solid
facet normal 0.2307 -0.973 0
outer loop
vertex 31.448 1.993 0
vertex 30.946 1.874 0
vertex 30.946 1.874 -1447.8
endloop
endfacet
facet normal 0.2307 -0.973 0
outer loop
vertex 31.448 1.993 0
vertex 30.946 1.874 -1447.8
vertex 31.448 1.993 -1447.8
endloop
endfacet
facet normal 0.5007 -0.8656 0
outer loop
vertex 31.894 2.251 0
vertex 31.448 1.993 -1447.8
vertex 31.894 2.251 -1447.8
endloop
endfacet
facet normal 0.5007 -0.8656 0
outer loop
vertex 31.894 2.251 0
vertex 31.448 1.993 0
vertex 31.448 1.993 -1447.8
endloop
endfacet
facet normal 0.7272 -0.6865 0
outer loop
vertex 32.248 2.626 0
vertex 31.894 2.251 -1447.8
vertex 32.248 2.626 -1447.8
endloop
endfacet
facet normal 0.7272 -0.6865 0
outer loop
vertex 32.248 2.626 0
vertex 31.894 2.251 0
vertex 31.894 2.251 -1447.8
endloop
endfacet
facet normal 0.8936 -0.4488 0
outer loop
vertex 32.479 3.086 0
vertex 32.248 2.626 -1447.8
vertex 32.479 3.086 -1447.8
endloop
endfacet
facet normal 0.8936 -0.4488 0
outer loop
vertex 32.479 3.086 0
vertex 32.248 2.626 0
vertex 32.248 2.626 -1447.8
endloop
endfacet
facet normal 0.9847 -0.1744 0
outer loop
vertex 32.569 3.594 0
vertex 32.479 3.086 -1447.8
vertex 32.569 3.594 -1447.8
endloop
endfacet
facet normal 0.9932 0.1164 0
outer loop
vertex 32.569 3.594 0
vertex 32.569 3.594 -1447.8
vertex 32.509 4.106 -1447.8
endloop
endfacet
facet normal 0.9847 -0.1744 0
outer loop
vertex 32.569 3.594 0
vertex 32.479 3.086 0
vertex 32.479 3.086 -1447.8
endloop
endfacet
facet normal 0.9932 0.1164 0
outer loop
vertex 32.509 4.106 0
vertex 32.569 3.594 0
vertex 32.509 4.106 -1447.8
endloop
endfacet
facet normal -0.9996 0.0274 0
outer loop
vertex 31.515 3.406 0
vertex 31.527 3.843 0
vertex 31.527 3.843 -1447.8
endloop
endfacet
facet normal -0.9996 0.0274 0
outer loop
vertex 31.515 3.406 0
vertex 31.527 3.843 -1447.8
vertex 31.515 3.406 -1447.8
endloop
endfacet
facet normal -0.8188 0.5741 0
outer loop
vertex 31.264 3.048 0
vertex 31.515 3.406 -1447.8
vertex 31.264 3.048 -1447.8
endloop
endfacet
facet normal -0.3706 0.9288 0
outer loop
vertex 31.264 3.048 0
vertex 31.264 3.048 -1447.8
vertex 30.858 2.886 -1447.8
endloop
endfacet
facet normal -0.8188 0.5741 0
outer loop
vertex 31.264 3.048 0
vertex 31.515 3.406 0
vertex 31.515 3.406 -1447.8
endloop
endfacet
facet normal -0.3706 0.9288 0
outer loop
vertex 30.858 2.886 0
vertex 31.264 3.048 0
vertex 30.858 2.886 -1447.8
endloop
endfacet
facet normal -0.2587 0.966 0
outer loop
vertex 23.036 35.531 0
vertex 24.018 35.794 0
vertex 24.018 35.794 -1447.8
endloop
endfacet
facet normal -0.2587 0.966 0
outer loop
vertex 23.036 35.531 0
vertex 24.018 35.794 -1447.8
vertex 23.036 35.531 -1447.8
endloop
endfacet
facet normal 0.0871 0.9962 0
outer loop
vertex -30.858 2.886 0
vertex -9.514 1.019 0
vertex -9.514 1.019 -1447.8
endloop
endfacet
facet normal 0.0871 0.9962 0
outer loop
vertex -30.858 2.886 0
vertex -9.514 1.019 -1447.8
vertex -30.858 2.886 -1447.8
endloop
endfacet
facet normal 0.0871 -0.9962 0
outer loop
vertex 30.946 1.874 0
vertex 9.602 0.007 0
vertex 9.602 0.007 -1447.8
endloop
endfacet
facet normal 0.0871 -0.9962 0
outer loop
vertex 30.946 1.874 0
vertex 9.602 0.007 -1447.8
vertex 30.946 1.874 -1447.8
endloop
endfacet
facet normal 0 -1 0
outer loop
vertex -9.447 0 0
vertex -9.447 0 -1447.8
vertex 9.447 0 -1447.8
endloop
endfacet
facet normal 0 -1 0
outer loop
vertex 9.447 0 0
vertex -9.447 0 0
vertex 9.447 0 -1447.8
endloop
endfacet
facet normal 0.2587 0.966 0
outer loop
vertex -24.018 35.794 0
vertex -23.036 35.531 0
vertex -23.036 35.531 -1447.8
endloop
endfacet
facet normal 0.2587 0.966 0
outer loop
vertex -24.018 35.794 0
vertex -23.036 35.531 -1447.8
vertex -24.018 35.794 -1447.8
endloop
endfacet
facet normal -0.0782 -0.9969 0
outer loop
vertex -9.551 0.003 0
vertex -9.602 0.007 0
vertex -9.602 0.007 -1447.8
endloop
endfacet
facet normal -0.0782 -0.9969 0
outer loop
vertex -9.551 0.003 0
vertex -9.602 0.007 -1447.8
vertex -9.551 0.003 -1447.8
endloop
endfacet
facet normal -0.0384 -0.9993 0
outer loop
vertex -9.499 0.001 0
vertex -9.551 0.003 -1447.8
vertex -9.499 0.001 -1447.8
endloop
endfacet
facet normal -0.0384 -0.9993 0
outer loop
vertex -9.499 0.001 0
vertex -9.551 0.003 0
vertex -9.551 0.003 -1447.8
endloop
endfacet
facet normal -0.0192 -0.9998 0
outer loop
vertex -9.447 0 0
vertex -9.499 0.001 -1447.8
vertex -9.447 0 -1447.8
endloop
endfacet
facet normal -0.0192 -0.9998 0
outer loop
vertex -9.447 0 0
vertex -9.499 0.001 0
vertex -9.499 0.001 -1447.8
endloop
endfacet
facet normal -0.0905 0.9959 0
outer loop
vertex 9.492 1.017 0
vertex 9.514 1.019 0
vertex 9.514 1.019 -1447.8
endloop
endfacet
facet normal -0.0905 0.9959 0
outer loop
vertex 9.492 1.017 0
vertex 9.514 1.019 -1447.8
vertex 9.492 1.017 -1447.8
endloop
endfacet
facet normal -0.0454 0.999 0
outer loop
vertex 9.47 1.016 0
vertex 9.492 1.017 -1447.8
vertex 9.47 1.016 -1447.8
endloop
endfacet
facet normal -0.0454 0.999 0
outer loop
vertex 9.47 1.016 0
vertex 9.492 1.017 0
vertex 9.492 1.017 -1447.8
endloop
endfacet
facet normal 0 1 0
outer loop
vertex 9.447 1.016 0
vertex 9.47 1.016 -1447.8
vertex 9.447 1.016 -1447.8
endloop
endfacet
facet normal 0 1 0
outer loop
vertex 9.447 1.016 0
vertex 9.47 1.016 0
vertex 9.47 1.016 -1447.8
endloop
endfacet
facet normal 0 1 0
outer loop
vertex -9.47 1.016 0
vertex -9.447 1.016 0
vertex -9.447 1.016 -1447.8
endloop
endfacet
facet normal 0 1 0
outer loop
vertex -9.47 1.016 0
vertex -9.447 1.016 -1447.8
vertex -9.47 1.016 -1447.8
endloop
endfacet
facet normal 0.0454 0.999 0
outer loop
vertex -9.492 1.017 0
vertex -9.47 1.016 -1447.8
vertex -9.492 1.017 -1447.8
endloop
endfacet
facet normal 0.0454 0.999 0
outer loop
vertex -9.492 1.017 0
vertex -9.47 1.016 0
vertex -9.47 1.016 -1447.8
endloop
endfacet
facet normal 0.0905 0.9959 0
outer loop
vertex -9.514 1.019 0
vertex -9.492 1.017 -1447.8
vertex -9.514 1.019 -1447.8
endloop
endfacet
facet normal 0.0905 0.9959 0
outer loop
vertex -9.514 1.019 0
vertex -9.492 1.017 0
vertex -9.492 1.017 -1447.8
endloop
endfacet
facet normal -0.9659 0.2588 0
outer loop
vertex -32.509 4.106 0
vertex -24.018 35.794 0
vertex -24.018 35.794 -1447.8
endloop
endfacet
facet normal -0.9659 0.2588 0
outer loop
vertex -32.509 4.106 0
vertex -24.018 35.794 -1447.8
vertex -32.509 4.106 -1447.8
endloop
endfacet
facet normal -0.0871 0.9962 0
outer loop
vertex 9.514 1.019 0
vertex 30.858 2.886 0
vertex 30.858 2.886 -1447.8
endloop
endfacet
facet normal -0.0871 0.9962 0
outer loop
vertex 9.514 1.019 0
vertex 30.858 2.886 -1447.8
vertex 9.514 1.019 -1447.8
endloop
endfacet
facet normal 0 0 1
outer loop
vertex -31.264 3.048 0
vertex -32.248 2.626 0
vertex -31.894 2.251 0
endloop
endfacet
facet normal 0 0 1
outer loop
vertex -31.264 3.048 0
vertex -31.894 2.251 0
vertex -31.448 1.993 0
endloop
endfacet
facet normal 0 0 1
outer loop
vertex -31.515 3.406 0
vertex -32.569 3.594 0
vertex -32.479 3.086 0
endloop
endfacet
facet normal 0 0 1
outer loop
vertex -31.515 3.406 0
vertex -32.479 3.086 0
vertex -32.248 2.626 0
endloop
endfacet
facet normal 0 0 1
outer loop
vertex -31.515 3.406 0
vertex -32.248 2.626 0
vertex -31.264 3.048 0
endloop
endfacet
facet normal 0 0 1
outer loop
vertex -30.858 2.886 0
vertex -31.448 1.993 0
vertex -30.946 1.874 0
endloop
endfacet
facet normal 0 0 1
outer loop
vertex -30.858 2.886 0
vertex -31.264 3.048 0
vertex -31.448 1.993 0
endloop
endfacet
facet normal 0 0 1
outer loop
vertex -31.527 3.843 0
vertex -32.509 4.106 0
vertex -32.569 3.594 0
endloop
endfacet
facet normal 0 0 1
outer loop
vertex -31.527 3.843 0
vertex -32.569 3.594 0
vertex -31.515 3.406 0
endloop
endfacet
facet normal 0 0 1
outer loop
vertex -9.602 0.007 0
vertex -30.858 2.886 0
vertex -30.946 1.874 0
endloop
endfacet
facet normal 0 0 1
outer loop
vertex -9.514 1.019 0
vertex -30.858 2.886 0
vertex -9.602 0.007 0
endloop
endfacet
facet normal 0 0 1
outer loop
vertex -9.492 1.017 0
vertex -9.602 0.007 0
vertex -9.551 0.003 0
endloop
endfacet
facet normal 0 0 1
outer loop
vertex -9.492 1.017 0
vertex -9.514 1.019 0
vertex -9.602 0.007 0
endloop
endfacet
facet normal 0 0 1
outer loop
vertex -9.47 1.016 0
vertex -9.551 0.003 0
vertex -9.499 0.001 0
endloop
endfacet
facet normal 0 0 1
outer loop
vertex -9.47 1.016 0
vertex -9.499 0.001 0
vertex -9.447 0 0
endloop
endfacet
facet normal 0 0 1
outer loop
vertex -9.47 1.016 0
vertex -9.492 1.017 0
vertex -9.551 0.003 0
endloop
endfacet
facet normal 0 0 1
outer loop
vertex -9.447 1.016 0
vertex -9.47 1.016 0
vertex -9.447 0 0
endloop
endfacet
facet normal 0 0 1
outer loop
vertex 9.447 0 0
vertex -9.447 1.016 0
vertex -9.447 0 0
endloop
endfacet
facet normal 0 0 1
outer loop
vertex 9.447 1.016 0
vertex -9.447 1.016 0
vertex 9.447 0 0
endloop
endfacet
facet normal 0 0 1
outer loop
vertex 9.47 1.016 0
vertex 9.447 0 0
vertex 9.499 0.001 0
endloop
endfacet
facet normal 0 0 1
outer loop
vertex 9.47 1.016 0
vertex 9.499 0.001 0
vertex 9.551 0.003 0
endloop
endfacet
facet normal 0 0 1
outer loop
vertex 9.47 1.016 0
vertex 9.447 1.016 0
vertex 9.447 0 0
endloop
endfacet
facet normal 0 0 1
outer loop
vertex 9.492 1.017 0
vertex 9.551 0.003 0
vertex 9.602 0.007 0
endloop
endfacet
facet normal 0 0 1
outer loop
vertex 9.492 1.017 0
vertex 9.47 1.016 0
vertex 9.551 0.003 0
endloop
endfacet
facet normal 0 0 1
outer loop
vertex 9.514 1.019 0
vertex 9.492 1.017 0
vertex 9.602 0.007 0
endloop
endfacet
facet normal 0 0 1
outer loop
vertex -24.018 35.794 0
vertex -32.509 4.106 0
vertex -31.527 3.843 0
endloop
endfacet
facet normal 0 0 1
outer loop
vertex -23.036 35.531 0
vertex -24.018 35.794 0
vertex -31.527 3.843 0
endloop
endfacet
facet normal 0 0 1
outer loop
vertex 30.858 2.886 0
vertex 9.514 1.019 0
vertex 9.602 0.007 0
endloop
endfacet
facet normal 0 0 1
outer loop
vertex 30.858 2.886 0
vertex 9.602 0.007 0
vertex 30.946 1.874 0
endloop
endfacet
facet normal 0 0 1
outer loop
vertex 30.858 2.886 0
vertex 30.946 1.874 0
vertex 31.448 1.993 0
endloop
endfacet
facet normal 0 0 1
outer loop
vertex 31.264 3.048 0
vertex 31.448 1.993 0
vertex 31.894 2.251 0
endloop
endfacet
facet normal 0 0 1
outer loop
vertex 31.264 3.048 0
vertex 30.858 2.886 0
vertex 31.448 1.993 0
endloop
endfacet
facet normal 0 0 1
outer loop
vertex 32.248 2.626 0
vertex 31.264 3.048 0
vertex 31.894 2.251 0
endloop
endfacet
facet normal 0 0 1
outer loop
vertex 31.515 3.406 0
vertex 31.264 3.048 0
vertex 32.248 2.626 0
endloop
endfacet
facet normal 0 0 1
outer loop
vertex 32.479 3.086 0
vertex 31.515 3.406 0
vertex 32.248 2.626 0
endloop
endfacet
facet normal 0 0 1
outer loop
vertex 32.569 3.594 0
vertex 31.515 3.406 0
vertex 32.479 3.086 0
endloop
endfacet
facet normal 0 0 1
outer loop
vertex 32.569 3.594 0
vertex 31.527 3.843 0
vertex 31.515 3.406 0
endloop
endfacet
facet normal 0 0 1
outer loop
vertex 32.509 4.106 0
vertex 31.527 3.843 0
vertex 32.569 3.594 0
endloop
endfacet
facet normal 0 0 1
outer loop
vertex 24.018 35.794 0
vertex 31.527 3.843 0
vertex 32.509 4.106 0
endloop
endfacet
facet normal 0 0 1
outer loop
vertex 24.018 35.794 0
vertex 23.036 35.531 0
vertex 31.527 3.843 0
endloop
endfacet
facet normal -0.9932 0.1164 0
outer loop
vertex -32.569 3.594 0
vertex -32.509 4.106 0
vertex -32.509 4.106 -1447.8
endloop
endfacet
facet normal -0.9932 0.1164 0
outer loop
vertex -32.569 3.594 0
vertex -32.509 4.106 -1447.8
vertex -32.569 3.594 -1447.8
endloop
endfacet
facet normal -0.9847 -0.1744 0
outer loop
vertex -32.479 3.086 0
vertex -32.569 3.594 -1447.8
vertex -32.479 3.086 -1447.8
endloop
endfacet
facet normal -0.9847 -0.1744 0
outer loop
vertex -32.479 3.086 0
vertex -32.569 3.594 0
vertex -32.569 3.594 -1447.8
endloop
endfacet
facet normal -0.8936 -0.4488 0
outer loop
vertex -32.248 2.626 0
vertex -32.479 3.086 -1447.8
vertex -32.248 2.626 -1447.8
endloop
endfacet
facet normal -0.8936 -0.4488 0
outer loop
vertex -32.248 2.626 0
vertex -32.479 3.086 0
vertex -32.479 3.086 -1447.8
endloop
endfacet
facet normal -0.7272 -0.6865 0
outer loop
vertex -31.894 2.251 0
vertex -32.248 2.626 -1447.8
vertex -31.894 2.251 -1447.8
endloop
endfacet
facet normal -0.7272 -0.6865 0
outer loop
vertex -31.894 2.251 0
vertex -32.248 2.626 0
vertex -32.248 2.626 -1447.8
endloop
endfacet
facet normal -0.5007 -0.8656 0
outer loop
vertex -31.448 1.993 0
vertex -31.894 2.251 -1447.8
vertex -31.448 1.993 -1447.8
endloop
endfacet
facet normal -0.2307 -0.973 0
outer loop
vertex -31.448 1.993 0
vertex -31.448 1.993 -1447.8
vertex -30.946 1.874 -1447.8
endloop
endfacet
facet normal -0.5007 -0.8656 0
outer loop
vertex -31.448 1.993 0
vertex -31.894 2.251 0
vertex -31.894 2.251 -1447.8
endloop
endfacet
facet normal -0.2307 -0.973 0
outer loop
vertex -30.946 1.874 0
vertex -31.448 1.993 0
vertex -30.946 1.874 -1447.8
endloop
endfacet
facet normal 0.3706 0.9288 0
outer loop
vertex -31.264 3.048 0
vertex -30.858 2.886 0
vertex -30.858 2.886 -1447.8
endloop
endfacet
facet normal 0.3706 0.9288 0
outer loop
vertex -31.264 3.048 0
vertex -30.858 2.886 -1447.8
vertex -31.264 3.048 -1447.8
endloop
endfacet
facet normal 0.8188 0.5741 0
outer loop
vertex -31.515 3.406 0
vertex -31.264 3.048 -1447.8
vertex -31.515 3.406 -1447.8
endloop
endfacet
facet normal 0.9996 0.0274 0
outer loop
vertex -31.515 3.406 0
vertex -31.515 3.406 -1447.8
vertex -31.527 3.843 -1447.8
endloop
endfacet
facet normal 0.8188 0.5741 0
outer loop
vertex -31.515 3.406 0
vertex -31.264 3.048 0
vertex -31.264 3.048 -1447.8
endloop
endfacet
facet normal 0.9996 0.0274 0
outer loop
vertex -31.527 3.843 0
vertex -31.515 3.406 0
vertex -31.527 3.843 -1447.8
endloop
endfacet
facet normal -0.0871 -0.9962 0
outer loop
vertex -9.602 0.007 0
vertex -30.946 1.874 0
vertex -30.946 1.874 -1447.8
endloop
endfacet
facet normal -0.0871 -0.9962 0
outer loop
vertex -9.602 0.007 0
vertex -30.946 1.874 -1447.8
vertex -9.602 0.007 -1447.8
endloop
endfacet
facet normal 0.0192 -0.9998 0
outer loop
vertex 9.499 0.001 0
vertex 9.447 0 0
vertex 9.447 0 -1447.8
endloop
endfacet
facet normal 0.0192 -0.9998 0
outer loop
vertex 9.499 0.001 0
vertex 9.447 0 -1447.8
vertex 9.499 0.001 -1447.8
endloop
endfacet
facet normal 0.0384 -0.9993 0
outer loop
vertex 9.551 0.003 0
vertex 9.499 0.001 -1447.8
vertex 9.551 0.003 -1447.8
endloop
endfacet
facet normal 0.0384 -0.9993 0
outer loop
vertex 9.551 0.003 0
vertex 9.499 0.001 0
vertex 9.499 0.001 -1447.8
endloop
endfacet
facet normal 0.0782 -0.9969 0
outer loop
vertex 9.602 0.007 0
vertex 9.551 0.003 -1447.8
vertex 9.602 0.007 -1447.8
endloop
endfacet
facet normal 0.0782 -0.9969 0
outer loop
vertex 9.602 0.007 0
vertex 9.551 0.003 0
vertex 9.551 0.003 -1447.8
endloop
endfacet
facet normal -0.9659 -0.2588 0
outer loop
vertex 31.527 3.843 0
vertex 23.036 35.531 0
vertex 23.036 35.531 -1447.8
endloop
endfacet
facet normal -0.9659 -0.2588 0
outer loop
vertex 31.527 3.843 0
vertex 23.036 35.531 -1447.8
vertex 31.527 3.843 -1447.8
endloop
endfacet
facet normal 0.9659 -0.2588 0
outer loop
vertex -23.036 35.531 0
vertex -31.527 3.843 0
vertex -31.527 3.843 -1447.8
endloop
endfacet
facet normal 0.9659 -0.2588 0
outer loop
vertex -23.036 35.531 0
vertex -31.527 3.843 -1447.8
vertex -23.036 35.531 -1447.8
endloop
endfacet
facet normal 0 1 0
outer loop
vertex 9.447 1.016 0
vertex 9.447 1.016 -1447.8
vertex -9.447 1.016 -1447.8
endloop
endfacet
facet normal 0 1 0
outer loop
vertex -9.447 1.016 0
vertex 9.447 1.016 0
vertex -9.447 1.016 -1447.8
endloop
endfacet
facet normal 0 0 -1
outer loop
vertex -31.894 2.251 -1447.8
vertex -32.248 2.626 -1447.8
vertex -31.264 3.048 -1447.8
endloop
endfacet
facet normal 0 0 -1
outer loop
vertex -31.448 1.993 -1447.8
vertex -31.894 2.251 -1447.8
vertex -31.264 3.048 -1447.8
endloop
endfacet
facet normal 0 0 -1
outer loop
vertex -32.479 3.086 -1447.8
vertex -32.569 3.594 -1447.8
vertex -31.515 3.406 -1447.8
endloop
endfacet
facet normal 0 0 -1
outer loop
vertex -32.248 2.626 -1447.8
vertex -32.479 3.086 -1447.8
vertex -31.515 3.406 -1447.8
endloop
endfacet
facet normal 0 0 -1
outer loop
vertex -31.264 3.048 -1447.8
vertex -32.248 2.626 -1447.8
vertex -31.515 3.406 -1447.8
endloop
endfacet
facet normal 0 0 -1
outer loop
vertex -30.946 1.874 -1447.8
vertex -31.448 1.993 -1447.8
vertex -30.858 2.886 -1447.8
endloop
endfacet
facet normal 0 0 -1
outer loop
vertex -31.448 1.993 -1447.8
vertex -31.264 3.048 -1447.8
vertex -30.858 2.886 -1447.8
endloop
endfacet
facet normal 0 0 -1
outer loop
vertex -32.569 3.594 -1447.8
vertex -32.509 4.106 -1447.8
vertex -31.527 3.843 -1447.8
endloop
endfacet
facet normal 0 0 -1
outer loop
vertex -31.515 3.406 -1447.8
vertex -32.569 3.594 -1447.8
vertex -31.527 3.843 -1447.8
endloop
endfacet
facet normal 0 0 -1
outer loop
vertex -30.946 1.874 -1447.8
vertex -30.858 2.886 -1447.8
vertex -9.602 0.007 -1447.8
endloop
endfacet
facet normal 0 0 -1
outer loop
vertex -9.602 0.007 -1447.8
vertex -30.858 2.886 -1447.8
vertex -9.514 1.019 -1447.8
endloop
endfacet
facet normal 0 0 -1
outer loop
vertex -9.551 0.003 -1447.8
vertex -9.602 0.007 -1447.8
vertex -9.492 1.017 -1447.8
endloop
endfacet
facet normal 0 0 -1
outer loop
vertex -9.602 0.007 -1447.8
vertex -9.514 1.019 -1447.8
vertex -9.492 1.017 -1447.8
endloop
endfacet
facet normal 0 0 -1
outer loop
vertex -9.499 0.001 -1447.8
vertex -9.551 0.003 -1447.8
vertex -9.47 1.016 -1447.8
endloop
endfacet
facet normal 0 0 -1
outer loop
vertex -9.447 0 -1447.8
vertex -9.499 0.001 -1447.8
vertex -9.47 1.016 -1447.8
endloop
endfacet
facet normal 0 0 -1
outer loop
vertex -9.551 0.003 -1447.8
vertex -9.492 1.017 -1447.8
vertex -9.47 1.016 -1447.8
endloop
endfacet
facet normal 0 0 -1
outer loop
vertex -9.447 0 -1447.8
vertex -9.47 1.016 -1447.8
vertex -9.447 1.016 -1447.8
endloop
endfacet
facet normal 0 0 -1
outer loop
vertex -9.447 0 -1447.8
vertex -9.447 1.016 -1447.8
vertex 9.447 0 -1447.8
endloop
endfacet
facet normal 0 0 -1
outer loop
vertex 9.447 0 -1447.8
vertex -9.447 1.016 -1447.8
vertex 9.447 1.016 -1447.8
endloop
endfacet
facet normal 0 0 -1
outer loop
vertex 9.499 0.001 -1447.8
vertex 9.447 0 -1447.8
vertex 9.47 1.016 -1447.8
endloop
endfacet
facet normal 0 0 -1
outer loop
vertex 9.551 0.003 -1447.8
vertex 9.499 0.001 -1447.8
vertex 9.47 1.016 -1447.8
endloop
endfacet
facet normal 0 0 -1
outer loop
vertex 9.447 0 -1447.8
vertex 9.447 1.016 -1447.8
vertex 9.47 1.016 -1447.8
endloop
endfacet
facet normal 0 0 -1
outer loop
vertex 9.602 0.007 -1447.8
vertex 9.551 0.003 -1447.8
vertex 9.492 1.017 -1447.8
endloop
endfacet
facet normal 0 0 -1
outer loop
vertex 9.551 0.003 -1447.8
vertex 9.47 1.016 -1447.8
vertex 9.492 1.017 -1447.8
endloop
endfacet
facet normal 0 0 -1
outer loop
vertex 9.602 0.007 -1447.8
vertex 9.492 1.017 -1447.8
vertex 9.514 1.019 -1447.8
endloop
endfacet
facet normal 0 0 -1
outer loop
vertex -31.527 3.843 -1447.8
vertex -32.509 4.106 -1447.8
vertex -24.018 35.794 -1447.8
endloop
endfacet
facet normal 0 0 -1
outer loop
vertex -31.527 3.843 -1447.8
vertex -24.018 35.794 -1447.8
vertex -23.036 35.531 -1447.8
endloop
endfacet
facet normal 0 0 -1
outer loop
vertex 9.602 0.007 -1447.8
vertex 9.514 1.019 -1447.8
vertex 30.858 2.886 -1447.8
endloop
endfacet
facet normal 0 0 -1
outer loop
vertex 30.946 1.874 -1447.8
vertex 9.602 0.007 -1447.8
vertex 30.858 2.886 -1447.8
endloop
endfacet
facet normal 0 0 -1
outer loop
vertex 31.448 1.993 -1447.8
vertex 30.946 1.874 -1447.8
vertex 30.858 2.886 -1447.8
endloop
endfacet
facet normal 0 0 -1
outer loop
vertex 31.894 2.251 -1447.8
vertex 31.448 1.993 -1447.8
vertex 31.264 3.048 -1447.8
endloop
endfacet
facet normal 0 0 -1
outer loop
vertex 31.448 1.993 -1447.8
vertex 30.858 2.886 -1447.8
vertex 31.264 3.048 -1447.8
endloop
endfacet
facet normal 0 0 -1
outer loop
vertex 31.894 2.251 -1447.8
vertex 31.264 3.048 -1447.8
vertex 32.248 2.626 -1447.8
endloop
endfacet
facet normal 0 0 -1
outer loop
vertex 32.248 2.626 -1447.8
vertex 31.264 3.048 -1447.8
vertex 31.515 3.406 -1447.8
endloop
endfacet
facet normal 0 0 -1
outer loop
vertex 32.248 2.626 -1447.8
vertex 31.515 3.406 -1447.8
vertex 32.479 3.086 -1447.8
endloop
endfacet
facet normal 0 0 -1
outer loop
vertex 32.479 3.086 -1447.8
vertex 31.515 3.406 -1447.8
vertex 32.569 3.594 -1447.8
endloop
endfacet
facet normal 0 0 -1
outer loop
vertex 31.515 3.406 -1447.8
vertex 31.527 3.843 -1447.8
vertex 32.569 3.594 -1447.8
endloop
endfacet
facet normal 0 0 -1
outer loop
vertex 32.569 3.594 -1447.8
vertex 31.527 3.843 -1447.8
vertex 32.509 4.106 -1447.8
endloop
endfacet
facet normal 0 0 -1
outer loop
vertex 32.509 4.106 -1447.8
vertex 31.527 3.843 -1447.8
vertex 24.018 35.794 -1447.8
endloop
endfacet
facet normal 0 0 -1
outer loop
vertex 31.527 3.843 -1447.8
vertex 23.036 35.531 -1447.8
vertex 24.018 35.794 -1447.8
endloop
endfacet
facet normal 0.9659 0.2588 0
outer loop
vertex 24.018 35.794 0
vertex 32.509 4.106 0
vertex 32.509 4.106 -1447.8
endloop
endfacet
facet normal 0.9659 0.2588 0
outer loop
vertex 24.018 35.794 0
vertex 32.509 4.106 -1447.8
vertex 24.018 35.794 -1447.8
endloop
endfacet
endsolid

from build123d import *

# Parameters (mm, degrees)
BASE_FLANGE1_DEPTH = 1447.8


# Sheet-metal steps are written as plain solids
with BuildPart() as part:
    # Sketch1 → Base-Flange1 (new body)
    with BuildSketch(Plane.XY):
        with BuildLine():
            Line((-24.017856008, 35.793752438), (-32.508689678, 4.105529785))
            ThreePointArc((-32.508689678, 4.105529785), (-32.247725893, 2.625530619), (-30.946236469, 1.87411535))
            Line((-30.946236469, 1.87411535), (-9.602333754, 0.006765827))
            ThreePointArc((-9.602333754, 0.006765827), (-9.524926114, 0.001692262), (-9.447370844, 0))
            Line((-9.447370844, 0), (9.447370844, 0))
            ThreePointArc((9.447370844, 0), (9.524926114, 0.001692262), (9.602333754, 0.006765827))
            Line((9.602333754, 0.006765827), (30.946236469, 1.87411535))
            ThreePointArc((30.946236469, 1.87411535), (32.247725893, 2.625530619), (32.508689678, 4.105529785))
            Line((32.508689678, 4.105529785), (24.017856008, 35.793752438))
            Line((24.017856008, 35.793752438), (23.036475369, 35.530792289))
            Line((23.036475369, 35.530792289), (31.527309038, 3.842569635))
            ThreePointArc((31.527309038, 3.842569635), (31.415467416, 3.208284278), (30.857686234, 2.886249163))
            Line((30.857686234, 2.886249163), (9.513783519, 1.01889964))
            ThreePointArc((9.513783519, 1.01889964), (9.480608817, 1.016725255), (9.447370844, 1.016))
            Line((9.447370844, 1.016), (-9.447370844, 1.016))
            ThreePointArc((-9.447370844, 1.016), (-9.480608817, 1.016725255), (-9.513783519, 1.01889964))
            Line((-9.513783519, 1.01889964), (-30.857686234, 2.886249163))
            ThreePointArc((-30.857686234, 2.886249163), (-31.415467416, 3.208284278), (-31.527309038, 3.842569635))
            Line((-31.527309038, 3.842569635), (-23.036475369, 35.530792289))
            Line((-23.036475369, 35.530792289), (-24.017856008, 35.793752438))
        make_face()
    extrude(amount=-BASE_FLANGE1_DEPTH)


solid = part.part
